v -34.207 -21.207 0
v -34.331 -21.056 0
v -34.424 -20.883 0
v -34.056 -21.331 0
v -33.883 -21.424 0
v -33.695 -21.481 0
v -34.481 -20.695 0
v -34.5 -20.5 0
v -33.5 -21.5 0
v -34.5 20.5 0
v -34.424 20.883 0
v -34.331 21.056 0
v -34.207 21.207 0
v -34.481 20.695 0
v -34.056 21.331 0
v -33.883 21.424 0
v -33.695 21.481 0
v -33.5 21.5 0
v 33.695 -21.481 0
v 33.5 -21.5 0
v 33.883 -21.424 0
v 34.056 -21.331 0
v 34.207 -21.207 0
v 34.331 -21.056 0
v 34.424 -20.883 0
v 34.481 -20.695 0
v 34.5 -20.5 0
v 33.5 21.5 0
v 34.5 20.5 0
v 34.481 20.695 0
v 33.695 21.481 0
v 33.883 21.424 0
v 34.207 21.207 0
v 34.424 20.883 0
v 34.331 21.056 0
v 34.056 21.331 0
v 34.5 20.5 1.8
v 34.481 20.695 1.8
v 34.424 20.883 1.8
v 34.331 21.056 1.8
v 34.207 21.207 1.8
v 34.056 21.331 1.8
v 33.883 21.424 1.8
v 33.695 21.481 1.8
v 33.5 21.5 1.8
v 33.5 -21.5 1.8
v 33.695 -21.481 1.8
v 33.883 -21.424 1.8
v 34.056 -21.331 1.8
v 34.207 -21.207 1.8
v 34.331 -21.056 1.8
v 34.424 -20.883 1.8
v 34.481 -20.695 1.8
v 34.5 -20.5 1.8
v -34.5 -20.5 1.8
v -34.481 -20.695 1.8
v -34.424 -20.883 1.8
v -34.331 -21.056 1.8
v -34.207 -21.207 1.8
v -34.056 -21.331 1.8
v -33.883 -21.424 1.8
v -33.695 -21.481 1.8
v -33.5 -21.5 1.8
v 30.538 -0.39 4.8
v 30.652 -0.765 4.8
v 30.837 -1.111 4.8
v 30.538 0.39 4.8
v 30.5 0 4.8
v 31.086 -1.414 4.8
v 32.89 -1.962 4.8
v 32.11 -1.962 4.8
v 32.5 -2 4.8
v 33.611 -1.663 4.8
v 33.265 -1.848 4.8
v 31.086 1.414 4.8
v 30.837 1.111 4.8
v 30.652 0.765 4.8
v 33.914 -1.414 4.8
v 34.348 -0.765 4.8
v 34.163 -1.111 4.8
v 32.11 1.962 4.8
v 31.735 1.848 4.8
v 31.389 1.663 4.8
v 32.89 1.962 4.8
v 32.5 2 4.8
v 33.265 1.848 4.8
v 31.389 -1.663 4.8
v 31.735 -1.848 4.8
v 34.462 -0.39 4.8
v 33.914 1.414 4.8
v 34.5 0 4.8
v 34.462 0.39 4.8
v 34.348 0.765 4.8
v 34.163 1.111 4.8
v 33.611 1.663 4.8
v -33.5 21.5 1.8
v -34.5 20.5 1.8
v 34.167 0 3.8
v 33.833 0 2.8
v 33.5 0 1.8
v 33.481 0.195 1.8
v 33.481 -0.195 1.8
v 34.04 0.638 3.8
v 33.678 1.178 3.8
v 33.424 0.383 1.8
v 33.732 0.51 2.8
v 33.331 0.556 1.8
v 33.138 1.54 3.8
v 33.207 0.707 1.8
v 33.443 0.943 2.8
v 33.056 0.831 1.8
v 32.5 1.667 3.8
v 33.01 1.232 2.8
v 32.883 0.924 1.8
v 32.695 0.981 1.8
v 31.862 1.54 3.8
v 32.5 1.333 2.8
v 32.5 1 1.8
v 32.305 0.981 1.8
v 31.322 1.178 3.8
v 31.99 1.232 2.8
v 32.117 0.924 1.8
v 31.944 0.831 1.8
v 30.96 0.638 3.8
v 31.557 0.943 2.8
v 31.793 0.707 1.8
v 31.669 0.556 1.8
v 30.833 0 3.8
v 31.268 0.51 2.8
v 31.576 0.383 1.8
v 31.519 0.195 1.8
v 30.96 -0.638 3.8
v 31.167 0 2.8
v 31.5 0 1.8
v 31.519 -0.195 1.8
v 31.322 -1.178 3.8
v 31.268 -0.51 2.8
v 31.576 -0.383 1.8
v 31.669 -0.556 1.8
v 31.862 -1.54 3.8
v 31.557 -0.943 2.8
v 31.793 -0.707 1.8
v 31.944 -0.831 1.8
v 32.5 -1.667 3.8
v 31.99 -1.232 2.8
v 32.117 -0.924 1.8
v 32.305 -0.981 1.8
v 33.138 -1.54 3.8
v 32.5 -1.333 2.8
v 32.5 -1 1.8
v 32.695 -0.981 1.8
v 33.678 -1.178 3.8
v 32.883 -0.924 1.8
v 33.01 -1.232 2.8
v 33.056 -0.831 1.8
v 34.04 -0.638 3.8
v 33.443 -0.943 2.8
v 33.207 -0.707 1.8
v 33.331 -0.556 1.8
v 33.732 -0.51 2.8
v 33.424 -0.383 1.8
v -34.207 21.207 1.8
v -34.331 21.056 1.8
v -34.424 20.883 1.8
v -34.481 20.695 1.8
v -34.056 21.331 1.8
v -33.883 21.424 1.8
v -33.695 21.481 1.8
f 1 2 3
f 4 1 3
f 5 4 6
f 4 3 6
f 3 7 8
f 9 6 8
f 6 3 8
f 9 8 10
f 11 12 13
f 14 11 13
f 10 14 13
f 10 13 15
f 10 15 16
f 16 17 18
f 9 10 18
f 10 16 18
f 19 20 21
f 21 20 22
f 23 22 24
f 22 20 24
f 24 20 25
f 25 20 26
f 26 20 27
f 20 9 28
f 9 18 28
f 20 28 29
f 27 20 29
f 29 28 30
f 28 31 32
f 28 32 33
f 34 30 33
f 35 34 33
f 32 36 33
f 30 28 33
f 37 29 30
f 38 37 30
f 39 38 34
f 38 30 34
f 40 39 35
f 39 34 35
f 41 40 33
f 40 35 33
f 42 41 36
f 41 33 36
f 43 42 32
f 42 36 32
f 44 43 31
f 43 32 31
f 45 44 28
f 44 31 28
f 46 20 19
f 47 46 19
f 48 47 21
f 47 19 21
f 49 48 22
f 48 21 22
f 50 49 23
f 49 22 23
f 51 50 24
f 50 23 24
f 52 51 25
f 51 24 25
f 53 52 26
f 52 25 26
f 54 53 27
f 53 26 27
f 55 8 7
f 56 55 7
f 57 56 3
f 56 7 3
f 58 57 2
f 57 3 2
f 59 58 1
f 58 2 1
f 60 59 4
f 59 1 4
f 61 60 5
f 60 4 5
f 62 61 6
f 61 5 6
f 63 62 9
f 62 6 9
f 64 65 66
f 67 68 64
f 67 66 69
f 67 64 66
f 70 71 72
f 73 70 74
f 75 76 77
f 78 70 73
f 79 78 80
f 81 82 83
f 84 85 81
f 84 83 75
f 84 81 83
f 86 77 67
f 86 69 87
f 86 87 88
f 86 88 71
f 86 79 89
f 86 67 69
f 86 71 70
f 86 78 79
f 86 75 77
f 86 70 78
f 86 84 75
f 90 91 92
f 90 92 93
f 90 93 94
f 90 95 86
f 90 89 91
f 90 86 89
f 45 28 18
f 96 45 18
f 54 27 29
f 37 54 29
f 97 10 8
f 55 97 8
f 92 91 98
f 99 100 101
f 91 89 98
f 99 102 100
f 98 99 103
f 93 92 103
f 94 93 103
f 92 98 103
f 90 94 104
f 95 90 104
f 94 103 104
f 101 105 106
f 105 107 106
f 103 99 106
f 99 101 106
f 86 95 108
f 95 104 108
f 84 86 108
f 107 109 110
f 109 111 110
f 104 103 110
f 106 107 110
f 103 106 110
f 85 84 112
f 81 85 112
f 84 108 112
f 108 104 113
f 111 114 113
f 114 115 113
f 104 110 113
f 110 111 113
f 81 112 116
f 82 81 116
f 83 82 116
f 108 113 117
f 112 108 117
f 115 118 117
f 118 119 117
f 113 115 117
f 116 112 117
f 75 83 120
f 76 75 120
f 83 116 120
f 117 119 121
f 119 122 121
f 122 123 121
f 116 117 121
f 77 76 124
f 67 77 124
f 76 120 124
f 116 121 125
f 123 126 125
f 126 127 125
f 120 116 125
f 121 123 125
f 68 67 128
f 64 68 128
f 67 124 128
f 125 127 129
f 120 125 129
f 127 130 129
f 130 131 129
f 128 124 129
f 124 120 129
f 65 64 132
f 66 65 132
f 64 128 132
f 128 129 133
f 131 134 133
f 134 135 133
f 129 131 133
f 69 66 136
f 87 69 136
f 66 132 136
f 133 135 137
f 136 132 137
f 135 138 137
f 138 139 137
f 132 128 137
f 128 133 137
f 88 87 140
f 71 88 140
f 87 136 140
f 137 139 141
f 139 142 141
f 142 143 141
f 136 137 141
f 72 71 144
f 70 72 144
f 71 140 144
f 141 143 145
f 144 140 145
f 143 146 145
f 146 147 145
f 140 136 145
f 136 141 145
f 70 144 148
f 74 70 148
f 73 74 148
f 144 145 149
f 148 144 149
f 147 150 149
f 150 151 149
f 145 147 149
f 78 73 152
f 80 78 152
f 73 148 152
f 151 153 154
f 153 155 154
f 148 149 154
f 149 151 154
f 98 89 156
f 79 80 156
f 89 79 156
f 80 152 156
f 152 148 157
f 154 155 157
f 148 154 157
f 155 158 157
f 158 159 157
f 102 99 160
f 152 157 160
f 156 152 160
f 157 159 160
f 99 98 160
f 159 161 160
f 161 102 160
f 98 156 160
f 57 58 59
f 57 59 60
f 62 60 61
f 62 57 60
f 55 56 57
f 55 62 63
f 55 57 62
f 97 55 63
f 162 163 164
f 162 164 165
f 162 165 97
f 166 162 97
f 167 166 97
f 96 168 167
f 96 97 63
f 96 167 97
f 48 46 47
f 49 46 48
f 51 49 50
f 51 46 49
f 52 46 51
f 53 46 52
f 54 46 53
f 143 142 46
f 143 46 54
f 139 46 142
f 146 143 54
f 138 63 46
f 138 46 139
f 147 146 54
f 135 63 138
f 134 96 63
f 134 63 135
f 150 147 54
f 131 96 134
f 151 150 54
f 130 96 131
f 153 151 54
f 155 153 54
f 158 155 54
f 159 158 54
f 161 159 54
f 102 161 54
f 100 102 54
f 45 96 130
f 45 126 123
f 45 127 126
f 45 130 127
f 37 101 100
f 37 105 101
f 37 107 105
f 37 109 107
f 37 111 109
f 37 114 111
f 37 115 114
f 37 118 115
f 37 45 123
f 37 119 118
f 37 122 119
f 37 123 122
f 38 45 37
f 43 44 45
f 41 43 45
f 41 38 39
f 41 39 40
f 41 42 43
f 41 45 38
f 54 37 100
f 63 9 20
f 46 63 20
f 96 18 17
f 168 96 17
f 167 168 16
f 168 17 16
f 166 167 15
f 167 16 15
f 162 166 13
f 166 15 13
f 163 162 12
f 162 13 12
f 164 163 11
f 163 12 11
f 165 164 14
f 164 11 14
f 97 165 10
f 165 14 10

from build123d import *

# Parameters (mm, degrees)
BOSS_EXTRUDE1_DEPTH = 1.8
SKETCH2_R           = 1
BOSS_EXTRUDE2_DEPTH = 3
BOSS_EXTRUDE2_DRAFT = -18.434


with BuildPart() as part:
    # Sketch1 → Boss-Extrude1 (new body)
    with BuildSketch(Plane.XY):
        with BuildLine():
            Line((-33.5, -21.5), (33.5, -21.5))
            ThreePointArc((33.5, -21.5), (34.207106781, -21.207106781), (34.5, -20.5))
            Line((34.5, -20.5), (34.5, 20.5))
            ThreePointArc((34.5, 20.5), (34.207106781, 21.207106781), (33.5, 21.5))
            Line((33.5, 21.5), (-33.5, 21.5))
            ThreePointArc((-33.5, 21.5), (-34.207106781, 21.207106781), (-34.5, 20.5))
            Line((-34.5, 20.5), (-34.5, -20.5))
            ThreePointArc((-34.5, -20.5), (-34.207106781, -21.207106781), (-33.5, -21.5))
        make_face()
    extrude(amount=BOSS_EXTRUDE1_DEPTH)


with BuildPart() as boss_extrude2_tool:
    # Sketch2 → Boss-Extrude2 (with draft: the straight prism first)
    with BuildSketch(Plane.XY.offset(1.8)):
        with Locations((32.5, 0)):
            Circle(SKETCH2_R)
    extrude(amount=BOSS_EXTRUDE2_DEPTH)
    # Boss-Extrude2: the draft: its side faces are tilted about the plane it starts from
    boss_extrude2_sides = [boss_extrude2_tool.faces().sort_by_distance(p)[0] for p in [
        (31.5, 0, 3.3),
    ]]
    draft(boss_extrude2_sides, Plane.XY.offset(1.8), BOSS_EXTRUDE2_DRAFT)


with BuildPart() as part_1:
    add(part.part)

    # Boss-Extrude2: add boss_extrude2_tool
    add(boss_extrude2_tool.part)


solid = part_1.part
